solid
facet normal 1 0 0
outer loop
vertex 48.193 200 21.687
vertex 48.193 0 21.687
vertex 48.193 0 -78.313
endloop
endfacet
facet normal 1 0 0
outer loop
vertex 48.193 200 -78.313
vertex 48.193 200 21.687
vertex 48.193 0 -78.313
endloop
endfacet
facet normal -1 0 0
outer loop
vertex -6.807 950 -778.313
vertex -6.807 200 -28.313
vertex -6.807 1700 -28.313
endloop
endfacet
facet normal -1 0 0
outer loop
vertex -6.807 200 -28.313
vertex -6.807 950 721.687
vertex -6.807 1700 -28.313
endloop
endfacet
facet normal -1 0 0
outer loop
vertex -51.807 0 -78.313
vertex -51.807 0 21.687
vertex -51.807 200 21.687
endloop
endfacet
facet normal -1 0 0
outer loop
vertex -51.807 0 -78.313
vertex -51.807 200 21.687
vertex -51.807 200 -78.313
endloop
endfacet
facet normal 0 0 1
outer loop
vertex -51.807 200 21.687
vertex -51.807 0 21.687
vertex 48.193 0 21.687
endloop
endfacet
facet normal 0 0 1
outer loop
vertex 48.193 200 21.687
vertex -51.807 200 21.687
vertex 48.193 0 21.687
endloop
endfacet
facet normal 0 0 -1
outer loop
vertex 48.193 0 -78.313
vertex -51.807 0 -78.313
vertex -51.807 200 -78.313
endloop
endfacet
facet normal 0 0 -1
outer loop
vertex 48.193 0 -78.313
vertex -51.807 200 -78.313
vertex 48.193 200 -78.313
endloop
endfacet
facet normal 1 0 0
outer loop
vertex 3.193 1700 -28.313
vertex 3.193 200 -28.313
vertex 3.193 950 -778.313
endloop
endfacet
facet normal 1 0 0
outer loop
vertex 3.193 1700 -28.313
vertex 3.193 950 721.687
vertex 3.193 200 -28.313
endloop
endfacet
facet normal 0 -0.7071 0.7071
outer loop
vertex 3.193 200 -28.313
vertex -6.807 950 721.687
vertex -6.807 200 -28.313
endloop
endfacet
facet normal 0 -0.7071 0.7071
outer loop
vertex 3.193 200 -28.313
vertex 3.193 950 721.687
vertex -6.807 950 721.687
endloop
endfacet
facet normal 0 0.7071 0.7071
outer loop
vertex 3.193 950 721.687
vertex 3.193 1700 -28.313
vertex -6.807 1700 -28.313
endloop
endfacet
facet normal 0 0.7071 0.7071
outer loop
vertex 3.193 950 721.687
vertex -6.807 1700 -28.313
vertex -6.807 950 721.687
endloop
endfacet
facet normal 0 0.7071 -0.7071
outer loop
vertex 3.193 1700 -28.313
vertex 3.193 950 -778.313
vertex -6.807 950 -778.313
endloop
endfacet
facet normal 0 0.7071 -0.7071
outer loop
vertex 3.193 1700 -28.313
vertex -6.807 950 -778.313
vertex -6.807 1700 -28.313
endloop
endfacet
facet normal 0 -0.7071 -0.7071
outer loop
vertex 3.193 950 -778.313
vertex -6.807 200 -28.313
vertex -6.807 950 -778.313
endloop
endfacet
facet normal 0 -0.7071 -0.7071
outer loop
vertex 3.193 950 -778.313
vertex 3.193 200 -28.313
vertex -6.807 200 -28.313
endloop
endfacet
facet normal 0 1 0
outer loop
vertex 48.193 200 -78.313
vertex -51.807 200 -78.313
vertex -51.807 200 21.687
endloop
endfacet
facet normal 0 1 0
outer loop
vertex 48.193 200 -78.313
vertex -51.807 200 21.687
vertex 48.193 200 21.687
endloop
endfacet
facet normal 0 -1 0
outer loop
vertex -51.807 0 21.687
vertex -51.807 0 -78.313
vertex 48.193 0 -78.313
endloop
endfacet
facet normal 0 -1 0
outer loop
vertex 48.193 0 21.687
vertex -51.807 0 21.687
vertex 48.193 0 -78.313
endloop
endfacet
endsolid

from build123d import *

# Parameters (mm, degrees)
SKETCH1_W                = 100
SKETCH1_H                = 100
BOSS_EXTRUDE1_DEPTH      = 200
BOSS_EXTRUDE2_DEPTH      = 5
BOSS_EXTRUDE2_DEPTH_BACK = 5


with BuildPart() as part:
    # Sketch1 → Boss-Extrude1 (new body)
    with BuildSketch(Plane(origin=(0, 0, 0), x_dir=(1, 0, 0), z_dir=(0, 1, 0))):
        with Locations((-1.807228916, 28.313253012)):
            Rectangle(SKETCH1_W, SKETCH1_H)
    extrude(amount=BOSS_EXTRUDE1_DEPTH)


with BuildPart() as body_2:
    # Sketch2 → Boss-Extrude2 (new body, two sides)
    with BuildSketch(Plane(origin=(-1.807228916, 0, 0), x_dir=(0, 0, -1), z_dir=(1, 0, 0))) as boss_extrude2_sk:
        Polygon((28.313253012, 200), (778.313253012, 950), (28.313253012, 1700), (-721.686746988, 950), align=None)
    extrude(amount=BOSS_EXTRUDE2_DEPTH)
    extrude(boss_extrude2_sk.sketch, amount=-BOSS_EXTRUDE2_DEPTH_BACK)


solid = Compound([part.part, body_2.part])
